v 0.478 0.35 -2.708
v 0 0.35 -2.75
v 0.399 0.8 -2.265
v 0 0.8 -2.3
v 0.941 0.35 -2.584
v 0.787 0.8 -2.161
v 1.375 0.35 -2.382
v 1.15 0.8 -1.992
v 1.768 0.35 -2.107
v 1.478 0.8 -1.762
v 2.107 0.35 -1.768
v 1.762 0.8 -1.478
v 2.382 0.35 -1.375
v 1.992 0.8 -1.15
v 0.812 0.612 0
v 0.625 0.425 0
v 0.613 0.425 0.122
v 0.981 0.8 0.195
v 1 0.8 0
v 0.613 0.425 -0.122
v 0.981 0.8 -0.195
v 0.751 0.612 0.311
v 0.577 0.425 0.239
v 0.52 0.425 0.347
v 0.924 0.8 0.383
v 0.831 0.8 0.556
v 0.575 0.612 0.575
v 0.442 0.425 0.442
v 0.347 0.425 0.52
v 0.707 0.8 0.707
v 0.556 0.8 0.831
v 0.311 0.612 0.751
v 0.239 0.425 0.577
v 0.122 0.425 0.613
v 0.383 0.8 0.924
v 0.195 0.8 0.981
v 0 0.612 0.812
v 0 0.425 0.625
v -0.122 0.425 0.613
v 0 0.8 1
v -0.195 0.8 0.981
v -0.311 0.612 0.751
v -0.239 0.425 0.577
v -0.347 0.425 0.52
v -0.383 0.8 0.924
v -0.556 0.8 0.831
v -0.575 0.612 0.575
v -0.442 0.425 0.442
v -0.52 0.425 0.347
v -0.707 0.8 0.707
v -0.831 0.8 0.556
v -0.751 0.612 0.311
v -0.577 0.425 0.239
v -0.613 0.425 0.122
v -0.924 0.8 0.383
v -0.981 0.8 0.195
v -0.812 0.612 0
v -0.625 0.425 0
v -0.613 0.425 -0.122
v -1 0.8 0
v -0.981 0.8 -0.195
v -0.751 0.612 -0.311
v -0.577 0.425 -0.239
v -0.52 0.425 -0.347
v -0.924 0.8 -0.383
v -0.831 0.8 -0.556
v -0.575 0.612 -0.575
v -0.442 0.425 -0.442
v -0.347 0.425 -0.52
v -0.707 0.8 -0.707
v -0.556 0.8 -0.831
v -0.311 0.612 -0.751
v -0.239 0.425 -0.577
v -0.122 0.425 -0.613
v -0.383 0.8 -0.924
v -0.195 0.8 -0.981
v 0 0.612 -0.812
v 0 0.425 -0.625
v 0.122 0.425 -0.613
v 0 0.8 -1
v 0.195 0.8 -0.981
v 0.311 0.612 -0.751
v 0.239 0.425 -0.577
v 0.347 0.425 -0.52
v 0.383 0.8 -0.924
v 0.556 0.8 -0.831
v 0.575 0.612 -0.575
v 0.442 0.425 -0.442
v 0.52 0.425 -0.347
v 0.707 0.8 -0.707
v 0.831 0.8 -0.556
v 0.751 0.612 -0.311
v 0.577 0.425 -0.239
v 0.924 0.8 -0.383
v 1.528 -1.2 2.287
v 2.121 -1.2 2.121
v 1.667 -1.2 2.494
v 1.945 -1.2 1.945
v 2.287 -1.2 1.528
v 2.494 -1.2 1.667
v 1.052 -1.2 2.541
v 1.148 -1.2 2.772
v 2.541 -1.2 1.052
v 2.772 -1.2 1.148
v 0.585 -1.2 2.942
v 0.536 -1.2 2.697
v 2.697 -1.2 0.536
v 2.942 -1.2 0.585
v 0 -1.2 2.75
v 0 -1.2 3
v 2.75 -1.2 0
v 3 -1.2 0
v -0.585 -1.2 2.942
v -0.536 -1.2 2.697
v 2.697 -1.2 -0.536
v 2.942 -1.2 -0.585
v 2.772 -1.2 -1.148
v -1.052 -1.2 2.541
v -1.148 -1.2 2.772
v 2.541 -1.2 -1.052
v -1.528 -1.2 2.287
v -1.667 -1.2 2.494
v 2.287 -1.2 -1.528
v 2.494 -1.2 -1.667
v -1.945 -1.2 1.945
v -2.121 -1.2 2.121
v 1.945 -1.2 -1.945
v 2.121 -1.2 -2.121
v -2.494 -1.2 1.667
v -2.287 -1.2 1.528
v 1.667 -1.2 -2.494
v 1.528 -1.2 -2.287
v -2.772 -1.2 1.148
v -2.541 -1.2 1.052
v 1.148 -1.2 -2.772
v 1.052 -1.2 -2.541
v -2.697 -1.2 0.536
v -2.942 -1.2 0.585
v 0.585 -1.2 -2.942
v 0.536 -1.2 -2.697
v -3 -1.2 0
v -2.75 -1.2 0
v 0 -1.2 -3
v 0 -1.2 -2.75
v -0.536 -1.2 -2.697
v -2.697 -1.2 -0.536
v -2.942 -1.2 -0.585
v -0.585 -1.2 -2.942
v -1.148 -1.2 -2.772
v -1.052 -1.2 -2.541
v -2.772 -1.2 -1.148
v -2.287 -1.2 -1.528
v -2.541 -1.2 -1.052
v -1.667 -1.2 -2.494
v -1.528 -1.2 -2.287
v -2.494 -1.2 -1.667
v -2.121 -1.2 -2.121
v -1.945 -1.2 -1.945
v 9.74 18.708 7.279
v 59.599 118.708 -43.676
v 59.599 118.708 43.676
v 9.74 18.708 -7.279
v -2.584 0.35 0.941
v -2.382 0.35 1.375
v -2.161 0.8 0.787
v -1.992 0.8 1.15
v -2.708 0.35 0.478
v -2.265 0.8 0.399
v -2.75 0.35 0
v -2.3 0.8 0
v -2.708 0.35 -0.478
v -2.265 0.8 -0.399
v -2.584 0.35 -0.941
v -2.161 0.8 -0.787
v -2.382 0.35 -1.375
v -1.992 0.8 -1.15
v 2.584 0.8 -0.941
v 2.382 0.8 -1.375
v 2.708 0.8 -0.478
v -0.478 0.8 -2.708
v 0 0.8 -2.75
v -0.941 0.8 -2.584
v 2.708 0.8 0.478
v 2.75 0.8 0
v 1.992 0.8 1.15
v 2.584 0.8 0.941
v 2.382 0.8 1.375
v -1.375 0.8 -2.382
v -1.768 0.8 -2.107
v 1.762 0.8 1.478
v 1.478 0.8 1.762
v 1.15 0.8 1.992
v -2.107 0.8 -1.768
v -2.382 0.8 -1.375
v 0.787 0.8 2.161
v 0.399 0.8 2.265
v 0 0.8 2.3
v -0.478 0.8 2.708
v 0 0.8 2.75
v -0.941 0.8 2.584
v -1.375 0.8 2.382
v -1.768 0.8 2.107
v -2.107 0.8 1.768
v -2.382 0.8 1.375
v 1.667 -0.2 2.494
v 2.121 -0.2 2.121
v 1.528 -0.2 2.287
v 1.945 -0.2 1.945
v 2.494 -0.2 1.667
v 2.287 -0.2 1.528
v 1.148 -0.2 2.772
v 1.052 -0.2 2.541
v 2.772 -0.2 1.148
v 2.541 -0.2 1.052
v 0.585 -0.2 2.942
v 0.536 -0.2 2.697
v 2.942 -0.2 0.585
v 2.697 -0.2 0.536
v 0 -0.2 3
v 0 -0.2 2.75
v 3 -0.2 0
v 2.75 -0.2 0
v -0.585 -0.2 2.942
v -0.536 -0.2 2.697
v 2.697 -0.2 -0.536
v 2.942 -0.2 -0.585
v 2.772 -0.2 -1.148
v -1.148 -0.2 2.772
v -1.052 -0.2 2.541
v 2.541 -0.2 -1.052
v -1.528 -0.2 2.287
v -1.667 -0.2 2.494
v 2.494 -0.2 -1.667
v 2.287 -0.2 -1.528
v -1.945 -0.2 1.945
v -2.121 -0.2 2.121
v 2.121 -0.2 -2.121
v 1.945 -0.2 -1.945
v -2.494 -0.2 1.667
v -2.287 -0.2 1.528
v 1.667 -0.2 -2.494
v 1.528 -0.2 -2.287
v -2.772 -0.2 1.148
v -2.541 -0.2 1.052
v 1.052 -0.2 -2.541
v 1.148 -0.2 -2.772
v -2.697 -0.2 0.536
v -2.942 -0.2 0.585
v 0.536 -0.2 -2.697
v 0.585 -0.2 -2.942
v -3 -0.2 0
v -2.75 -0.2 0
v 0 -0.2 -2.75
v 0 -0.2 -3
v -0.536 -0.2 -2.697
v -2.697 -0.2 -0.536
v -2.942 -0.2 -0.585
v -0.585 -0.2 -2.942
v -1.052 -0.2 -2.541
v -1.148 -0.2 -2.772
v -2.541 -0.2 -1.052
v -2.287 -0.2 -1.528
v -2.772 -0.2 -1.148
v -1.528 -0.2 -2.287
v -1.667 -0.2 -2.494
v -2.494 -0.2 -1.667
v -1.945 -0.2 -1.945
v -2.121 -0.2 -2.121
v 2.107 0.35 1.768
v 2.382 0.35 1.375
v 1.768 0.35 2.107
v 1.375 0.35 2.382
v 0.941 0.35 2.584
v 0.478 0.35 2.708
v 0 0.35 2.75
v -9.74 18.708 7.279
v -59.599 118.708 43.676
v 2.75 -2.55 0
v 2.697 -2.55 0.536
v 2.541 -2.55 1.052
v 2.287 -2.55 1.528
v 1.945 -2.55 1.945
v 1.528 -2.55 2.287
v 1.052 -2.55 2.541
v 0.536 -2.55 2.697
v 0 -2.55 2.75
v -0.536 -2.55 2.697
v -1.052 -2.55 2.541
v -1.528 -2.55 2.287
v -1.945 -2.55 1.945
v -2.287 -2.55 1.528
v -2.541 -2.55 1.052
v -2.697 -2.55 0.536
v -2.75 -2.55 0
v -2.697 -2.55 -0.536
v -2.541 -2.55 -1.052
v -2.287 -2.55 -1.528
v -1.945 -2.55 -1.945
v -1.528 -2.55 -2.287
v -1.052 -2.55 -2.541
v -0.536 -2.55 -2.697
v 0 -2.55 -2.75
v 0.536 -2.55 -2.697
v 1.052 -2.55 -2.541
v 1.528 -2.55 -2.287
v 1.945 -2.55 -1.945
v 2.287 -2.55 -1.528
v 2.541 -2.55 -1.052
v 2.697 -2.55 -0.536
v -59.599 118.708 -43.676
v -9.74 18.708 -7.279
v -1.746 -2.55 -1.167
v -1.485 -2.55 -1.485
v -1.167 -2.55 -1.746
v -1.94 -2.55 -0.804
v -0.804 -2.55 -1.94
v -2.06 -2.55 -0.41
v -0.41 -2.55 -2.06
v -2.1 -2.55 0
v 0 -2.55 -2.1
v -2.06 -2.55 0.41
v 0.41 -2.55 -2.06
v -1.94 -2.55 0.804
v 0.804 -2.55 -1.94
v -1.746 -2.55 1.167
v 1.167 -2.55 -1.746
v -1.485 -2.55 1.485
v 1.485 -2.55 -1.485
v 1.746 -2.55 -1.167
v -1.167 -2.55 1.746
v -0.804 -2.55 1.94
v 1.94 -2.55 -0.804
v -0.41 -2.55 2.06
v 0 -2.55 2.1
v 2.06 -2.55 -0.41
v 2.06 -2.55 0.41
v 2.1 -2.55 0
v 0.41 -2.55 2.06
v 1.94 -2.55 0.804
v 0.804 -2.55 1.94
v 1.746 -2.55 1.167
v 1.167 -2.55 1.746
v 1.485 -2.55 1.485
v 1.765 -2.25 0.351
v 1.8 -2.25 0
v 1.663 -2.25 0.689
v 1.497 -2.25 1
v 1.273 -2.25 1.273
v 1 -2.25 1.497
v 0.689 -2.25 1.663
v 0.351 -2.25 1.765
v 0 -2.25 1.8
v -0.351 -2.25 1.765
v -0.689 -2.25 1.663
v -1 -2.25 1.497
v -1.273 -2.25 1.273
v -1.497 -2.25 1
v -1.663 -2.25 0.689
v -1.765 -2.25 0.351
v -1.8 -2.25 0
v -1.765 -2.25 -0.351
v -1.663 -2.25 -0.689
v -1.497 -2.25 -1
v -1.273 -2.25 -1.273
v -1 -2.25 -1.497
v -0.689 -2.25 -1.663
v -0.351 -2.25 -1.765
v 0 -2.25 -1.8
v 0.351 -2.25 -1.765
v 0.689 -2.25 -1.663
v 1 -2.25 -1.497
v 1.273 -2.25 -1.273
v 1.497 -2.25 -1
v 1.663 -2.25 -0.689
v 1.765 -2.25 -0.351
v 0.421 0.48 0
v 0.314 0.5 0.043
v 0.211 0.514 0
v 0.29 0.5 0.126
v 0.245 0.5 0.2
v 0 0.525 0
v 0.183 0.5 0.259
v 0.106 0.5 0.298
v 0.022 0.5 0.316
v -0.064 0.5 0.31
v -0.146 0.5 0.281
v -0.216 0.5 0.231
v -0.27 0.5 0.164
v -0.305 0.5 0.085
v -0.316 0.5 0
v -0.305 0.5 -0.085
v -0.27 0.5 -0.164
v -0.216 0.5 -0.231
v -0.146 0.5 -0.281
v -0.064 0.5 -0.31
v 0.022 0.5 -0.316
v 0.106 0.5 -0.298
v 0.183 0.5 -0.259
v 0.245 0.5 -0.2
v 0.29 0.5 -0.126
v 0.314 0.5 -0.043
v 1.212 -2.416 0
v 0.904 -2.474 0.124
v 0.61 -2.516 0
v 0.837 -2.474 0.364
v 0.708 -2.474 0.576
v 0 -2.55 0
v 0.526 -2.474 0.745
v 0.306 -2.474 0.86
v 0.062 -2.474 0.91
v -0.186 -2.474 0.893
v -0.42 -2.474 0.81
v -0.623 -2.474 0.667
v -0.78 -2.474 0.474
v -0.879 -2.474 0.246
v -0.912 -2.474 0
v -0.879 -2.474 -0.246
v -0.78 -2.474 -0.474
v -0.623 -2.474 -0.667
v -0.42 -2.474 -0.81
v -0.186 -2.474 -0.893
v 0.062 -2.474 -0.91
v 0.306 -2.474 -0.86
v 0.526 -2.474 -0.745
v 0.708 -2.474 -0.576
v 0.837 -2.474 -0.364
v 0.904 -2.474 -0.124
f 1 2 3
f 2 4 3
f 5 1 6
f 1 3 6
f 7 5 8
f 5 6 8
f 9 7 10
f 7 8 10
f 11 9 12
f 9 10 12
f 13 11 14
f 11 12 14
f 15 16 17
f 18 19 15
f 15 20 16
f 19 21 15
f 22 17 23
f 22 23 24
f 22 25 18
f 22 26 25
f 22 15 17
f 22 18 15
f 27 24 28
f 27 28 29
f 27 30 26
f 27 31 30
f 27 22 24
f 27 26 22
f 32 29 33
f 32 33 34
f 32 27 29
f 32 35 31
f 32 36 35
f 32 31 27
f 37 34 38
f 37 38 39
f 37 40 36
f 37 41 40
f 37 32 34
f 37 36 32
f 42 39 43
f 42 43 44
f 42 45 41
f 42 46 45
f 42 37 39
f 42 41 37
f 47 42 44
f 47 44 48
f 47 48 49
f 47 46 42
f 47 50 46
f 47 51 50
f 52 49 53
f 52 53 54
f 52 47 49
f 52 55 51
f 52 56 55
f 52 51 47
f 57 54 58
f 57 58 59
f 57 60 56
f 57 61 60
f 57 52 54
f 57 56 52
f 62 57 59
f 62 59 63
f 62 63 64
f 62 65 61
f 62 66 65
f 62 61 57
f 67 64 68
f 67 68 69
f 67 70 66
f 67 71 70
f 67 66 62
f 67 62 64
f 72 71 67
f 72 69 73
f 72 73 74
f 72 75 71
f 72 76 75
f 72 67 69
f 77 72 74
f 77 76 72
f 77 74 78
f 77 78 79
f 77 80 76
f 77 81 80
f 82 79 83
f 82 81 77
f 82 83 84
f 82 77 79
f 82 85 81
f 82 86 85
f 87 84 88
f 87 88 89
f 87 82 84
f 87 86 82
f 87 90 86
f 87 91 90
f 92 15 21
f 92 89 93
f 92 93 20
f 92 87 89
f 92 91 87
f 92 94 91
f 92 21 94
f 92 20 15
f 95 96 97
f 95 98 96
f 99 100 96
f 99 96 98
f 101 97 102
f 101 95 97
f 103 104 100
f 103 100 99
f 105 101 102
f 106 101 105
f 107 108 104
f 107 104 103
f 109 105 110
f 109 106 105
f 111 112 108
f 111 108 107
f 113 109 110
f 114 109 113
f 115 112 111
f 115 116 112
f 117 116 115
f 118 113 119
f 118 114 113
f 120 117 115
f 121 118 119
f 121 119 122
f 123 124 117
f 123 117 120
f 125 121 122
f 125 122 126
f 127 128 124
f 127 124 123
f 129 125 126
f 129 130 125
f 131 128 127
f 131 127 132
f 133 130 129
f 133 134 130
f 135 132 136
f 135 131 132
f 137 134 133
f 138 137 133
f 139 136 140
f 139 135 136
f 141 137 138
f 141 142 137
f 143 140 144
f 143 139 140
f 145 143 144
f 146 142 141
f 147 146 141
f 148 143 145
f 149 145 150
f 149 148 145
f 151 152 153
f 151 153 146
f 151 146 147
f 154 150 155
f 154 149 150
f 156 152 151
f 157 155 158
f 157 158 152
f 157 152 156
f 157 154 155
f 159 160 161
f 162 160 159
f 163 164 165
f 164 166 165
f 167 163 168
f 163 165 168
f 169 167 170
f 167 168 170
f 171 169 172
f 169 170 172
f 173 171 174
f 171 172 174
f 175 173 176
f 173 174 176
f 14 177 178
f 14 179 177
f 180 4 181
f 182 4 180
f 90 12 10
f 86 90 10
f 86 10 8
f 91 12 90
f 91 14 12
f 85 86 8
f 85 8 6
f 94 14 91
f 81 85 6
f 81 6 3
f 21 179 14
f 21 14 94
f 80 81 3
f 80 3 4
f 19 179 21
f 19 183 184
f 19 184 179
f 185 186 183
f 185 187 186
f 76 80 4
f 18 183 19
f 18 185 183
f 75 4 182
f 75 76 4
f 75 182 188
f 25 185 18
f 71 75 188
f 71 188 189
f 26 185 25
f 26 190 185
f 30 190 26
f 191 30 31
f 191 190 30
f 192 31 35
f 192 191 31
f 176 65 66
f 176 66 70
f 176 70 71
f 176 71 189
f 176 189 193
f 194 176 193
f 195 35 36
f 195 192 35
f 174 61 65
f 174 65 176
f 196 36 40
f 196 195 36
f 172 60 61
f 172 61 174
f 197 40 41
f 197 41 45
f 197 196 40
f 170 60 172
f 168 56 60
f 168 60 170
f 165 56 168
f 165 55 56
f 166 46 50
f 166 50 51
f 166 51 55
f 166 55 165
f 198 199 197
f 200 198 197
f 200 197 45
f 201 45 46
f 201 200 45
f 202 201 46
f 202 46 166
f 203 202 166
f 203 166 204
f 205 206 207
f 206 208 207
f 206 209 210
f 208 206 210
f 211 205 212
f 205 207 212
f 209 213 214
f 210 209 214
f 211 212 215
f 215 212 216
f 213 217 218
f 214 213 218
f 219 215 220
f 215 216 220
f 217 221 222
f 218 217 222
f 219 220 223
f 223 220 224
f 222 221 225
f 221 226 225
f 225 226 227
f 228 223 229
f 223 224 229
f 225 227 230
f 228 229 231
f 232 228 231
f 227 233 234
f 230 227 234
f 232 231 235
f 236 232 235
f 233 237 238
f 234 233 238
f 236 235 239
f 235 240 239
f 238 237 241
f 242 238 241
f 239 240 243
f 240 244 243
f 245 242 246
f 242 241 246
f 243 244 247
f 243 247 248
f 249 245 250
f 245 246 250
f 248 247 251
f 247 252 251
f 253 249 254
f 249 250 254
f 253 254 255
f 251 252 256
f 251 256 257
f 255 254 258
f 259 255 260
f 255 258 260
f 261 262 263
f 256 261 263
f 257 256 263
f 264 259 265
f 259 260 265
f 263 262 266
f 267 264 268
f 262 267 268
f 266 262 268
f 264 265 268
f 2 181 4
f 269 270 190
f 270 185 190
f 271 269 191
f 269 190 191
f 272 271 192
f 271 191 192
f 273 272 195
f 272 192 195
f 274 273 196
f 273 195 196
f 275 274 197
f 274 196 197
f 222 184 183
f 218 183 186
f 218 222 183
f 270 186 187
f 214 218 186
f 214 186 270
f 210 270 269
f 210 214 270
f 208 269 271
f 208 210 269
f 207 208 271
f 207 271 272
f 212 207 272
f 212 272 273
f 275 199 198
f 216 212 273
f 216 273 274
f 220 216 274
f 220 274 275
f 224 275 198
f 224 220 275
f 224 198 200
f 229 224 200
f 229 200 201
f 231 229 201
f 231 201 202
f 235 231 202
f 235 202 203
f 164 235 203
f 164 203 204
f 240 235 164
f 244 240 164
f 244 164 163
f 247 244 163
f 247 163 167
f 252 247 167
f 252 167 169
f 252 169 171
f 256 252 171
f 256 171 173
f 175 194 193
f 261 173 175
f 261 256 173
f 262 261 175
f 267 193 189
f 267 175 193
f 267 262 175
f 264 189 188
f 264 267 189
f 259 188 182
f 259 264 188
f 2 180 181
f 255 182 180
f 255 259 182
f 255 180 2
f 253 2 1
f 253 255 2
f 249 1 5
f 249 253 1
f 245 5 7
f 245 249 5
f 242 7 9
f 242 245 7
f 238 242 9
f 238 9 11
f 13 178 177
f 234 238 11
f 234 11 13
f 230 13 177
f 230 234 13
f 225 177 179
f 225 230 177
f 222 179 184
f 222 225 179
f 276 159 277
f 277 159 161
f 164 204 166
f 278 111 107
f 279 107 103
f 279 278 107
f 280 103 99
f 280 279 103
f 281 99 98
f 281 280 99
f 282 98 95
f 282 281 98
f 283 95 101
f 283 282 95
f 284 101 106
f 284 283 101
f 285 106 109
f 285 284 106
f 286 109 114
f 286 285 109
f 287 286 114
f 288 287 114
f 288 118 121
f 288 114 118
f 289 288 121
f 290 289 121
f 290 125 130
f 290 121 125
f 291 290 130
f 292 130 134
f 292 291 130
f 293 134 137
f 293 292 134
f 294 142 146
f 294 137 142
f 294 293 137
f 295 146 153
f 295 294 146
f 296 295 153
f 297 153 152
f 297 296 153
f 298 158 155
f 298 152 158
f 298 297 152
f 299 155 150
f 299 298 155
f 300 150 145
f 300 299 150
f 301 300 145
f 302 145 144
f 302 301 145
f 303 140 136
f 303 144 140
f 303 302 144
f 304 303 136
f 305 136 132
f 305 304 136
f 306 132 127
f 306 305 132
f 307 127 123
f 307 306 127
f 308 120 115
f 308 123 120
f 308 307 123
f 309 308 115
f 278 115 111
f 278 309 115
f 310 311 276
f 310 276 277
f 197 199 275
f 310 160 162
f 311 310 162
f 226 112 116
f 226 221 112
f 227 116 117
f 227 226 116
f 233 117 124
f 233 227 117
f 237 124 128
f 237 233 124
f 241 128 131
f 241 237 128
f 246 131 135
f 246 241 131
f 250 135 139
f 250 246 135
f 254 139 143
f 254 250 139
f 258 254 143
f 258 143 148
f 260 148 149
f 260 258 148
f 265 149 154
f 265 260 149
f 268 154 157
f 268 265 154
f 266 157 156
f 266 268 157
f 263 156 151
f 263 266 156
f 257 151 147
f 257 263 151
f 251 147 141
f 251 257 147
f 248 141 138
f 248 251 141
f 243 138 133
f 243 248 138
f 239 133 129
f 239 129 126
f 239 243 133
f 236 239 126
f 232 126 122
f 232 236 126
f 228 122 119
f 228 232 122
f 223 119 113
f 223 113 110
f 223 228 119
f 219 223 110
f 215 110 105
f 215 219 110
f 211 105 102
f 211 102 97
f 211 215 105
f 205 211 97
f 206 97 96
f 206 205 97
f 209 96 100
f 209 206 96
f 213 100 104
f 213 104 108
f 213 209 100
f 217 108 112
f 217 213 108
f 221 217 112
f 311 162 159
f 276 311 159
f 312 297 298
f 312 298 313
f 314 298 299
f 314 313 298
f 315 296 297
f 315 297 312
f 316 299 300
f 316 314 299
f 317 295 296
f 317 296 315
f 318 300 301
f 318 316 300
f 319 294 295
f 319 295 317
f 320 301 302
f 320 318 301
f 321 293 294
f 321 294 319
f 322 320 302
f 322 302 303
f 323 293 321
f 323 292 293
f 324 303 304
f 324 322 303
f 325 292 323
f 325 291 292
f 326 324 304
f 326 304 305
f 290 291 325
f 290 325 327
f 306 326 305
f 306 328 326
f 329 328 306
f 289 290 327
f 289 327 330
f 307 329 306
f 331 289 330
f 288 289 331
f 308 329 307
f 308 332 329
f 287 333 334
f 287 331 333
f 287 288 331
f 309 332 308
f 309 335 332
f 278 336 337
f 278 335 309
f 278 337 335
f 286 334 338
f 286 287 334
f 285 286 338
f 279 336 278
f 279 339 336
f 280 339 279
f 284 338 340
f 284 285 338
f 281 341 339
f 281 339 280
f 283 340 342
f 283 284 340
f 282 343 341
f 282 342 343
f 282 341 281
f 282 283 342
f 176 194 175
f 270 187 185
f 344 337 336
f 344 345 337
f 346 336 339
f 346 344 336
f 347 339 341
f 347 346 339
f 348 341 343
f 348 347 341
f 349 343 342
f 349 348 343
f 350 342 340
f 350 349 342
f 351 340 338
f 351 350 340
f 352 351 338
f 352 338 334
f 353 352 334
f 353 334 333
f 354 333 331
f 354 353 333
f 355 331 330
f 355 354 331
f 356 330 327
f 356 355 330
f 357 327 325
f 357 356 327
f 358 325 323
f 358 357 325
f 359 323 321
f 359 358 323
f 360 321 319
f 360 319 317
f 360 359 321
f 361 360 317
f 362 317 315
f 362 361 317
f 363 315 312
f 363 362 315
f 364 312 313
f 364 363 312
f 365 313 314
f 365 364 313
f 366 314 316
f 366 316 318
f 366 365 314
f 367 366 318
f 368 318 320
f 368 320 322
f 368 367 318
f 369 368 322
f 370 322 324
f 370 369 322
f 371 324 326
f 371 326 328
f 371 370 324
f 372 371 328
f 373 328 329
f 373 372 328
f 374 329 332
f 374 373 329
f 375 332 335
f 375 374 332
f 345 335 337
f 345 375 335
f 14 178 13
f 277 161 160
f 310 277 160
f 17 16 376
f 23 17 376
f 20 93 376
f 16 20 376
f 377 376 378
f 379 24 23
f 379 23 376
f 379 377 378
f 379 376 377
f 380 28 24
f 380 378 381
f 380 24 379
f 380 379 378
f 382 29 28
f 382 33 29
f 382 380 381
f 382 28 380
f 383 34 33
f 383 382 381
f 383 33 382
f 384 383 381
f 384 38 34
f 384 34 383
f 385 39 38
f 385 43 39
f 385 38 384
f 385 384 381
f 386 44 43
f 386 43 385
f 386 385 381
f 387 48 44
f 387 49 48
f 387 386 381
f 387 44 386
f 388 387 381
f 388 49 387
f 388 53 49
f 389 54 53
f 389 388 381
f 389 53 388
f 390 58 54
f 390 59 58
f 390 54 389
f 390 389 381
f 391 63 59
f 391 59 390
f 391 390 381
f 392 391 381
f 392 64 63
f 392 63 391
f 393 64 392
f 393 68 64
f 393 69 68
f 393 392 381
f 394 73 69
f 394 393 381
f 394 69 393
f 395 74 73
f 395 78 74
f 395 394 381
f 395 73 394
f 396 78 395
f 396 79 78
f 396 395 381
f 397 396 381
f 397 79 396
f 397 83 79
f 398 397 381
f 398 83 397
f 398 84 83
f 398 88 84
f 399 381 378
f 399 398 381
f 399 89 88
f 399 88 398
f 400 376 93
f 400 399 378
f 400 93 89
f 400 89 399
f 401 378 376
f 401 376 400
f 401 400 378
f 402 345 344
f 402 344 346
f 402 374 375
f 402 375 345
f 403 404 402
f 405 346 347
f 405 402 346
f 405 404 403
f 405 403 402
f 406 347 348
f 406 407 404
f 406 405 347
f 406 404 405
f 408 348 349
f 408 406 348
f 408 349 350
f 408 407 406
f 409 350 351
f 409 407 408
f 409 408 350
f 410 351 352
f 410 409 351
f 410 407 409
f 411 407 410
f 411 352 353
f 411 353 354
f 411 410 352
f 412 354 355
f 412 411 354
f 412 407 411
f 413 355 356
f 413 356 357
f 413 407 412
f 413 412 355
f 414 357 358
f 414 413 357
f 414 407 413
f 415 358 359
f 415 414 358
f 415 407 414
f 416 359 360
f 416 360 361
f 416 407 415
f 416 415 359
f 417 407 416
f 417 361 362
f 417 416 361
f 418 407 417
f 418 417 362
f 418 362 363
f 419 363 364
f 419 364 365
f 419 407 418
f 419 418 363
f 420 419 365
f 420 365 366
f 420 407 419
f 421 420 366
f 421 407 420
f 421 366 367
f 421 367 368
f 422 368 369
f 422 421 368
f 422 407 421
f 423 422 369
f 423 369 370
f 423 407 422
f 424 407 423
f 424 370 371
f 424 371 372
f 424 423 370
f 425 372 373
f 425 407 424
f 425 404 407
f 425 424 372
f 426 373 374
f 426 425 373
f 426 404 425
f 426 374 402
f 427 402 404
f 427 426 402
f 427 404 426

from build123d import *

# Parameters (mm, degrees)
SKIZZE4_W             = 0.25
SKIZZE4_H             = 1
TOOLFACE_ANGLE        = 60
KREISMUSTER1_COUNT    = 3
FOV_3_6MM_F_2_9_DEPTH = 100
SKIZZE8_OUTSIDE_W     = 251.934
SKIZZE8_OUTSIDE_H     = 173.192
SKIZZE8_OUTSIDE_R     = 5
FOV2_DEPTH            = 44.676428112
FOV2_DEPTH_BACK       = 44.676428112


with BuildPart() as part:
    # Skizze3 → Body (revolve)
    with BuildSketch(Plane.XY):
        with BuildLine():
            Line((1, 0.8), (2.75, 0.8))
            Line((2.75, 0.8), (2.75, -2.55))
            Line((2.75, -2.55), (2.1, -2.55))
            Line((2.1, -2.55), (1.8, -2.25))
            ThreePointArc((1.8, -2.25), (0.91241438, -2.474486277), (0, -2.55))
            Line((0, -2.55), (0, 0.525))
            ThreePointArc((0, 0.525), (0.316474723, 0.499842016), (0.625, 0.425))
            Line((0.625, 0.425), (1, 0.8))
        make_face()
    revolve(axis=Axis((0, 0, 0), (0, -1, 0)))

    # Skizze4 → Thread (revolve)
    with BuildSketch(Plane.XY):
        with Locations((2.875, -0.7)):
            Rectangle(SKIZZE4_W, SKIZZE4_H)
    revolve(axis=Axis((0, 0, 0), (0, 1, 0)))

    # Skizze5 → Toolface (revolve, cut)
    with BuildSketch(Plane(origin=(0, 0, 0), x_dir=(0, 0, -1), z_dir=(1, 0, 0))):
        Polygon((2.75, 0.8), (2.75, 0.35), (2.3, 0.8), align=None)
    toolface = revolve(axis=Axis((0, 0, 0), (0, -1, 0)), revolution_arc=TOOLFACE_ANGLE, mode=Mode.SUBTRACT)

    # Kreismuster1: Toolface ×3 about axis
    kreismuster1_axis = Axis((0, 0, 0), (0, 1, 0))
    for i in range(1, KREISMUSTER1_COUNT):
        add(toolface.rotate(kreismuster1_axis, i * 360 / KREISMUSTER1_COUNT), mode=Mode.SUBTRACT)


with BuildPart() as body_2:
    # Skizze6 → FOV - 3,6mm f/2,9 (new body, symmetric)
    with BuildSketch(Plane(origin=(0, 0, 0), x_dir=(0, 0, -1), z_dir=(1, 0, 0))):
        Polygon((-7.279404685, 18.707826613), (-43.676428112, 118.707826613), (43.676428112, 118.707826613), (7.279404685, 18.707826613), align=None)
    extrude(amount=FOV_3_6MM_F_2_9_DEPTH, both=True)

    # Skizze8 outside → FOV2 (cut, two sides)
    with BuildSketch(Plane.XY) as fov2_sk:
        with Locations((0, 58.079)):
            Rectangle(SKIZZE8_OUTSIDE_W, SKIZZE8_OUTSIDE_H)
        Circle(SKIZZE8_OUTSIDE_R, mode=Mode.SUBTRACT)
        Polygon((-9.740481092, 18.707826613), (-59.598641898, 118.707826613), (59.598641898, 118.707826613), (9.740481092, 18.707826613), align=None, mode=Mode.SUBTRACT)
    extrude(amount=FOV2_DEPTH, mode=Mode.SUBTRACT)
    extrude(fov2_sk.sketch, amount=-FOV2_DEPTH_BACK, mode=Mode.SUBTRACT)


solid = Compound([part.part, body_2.part])
